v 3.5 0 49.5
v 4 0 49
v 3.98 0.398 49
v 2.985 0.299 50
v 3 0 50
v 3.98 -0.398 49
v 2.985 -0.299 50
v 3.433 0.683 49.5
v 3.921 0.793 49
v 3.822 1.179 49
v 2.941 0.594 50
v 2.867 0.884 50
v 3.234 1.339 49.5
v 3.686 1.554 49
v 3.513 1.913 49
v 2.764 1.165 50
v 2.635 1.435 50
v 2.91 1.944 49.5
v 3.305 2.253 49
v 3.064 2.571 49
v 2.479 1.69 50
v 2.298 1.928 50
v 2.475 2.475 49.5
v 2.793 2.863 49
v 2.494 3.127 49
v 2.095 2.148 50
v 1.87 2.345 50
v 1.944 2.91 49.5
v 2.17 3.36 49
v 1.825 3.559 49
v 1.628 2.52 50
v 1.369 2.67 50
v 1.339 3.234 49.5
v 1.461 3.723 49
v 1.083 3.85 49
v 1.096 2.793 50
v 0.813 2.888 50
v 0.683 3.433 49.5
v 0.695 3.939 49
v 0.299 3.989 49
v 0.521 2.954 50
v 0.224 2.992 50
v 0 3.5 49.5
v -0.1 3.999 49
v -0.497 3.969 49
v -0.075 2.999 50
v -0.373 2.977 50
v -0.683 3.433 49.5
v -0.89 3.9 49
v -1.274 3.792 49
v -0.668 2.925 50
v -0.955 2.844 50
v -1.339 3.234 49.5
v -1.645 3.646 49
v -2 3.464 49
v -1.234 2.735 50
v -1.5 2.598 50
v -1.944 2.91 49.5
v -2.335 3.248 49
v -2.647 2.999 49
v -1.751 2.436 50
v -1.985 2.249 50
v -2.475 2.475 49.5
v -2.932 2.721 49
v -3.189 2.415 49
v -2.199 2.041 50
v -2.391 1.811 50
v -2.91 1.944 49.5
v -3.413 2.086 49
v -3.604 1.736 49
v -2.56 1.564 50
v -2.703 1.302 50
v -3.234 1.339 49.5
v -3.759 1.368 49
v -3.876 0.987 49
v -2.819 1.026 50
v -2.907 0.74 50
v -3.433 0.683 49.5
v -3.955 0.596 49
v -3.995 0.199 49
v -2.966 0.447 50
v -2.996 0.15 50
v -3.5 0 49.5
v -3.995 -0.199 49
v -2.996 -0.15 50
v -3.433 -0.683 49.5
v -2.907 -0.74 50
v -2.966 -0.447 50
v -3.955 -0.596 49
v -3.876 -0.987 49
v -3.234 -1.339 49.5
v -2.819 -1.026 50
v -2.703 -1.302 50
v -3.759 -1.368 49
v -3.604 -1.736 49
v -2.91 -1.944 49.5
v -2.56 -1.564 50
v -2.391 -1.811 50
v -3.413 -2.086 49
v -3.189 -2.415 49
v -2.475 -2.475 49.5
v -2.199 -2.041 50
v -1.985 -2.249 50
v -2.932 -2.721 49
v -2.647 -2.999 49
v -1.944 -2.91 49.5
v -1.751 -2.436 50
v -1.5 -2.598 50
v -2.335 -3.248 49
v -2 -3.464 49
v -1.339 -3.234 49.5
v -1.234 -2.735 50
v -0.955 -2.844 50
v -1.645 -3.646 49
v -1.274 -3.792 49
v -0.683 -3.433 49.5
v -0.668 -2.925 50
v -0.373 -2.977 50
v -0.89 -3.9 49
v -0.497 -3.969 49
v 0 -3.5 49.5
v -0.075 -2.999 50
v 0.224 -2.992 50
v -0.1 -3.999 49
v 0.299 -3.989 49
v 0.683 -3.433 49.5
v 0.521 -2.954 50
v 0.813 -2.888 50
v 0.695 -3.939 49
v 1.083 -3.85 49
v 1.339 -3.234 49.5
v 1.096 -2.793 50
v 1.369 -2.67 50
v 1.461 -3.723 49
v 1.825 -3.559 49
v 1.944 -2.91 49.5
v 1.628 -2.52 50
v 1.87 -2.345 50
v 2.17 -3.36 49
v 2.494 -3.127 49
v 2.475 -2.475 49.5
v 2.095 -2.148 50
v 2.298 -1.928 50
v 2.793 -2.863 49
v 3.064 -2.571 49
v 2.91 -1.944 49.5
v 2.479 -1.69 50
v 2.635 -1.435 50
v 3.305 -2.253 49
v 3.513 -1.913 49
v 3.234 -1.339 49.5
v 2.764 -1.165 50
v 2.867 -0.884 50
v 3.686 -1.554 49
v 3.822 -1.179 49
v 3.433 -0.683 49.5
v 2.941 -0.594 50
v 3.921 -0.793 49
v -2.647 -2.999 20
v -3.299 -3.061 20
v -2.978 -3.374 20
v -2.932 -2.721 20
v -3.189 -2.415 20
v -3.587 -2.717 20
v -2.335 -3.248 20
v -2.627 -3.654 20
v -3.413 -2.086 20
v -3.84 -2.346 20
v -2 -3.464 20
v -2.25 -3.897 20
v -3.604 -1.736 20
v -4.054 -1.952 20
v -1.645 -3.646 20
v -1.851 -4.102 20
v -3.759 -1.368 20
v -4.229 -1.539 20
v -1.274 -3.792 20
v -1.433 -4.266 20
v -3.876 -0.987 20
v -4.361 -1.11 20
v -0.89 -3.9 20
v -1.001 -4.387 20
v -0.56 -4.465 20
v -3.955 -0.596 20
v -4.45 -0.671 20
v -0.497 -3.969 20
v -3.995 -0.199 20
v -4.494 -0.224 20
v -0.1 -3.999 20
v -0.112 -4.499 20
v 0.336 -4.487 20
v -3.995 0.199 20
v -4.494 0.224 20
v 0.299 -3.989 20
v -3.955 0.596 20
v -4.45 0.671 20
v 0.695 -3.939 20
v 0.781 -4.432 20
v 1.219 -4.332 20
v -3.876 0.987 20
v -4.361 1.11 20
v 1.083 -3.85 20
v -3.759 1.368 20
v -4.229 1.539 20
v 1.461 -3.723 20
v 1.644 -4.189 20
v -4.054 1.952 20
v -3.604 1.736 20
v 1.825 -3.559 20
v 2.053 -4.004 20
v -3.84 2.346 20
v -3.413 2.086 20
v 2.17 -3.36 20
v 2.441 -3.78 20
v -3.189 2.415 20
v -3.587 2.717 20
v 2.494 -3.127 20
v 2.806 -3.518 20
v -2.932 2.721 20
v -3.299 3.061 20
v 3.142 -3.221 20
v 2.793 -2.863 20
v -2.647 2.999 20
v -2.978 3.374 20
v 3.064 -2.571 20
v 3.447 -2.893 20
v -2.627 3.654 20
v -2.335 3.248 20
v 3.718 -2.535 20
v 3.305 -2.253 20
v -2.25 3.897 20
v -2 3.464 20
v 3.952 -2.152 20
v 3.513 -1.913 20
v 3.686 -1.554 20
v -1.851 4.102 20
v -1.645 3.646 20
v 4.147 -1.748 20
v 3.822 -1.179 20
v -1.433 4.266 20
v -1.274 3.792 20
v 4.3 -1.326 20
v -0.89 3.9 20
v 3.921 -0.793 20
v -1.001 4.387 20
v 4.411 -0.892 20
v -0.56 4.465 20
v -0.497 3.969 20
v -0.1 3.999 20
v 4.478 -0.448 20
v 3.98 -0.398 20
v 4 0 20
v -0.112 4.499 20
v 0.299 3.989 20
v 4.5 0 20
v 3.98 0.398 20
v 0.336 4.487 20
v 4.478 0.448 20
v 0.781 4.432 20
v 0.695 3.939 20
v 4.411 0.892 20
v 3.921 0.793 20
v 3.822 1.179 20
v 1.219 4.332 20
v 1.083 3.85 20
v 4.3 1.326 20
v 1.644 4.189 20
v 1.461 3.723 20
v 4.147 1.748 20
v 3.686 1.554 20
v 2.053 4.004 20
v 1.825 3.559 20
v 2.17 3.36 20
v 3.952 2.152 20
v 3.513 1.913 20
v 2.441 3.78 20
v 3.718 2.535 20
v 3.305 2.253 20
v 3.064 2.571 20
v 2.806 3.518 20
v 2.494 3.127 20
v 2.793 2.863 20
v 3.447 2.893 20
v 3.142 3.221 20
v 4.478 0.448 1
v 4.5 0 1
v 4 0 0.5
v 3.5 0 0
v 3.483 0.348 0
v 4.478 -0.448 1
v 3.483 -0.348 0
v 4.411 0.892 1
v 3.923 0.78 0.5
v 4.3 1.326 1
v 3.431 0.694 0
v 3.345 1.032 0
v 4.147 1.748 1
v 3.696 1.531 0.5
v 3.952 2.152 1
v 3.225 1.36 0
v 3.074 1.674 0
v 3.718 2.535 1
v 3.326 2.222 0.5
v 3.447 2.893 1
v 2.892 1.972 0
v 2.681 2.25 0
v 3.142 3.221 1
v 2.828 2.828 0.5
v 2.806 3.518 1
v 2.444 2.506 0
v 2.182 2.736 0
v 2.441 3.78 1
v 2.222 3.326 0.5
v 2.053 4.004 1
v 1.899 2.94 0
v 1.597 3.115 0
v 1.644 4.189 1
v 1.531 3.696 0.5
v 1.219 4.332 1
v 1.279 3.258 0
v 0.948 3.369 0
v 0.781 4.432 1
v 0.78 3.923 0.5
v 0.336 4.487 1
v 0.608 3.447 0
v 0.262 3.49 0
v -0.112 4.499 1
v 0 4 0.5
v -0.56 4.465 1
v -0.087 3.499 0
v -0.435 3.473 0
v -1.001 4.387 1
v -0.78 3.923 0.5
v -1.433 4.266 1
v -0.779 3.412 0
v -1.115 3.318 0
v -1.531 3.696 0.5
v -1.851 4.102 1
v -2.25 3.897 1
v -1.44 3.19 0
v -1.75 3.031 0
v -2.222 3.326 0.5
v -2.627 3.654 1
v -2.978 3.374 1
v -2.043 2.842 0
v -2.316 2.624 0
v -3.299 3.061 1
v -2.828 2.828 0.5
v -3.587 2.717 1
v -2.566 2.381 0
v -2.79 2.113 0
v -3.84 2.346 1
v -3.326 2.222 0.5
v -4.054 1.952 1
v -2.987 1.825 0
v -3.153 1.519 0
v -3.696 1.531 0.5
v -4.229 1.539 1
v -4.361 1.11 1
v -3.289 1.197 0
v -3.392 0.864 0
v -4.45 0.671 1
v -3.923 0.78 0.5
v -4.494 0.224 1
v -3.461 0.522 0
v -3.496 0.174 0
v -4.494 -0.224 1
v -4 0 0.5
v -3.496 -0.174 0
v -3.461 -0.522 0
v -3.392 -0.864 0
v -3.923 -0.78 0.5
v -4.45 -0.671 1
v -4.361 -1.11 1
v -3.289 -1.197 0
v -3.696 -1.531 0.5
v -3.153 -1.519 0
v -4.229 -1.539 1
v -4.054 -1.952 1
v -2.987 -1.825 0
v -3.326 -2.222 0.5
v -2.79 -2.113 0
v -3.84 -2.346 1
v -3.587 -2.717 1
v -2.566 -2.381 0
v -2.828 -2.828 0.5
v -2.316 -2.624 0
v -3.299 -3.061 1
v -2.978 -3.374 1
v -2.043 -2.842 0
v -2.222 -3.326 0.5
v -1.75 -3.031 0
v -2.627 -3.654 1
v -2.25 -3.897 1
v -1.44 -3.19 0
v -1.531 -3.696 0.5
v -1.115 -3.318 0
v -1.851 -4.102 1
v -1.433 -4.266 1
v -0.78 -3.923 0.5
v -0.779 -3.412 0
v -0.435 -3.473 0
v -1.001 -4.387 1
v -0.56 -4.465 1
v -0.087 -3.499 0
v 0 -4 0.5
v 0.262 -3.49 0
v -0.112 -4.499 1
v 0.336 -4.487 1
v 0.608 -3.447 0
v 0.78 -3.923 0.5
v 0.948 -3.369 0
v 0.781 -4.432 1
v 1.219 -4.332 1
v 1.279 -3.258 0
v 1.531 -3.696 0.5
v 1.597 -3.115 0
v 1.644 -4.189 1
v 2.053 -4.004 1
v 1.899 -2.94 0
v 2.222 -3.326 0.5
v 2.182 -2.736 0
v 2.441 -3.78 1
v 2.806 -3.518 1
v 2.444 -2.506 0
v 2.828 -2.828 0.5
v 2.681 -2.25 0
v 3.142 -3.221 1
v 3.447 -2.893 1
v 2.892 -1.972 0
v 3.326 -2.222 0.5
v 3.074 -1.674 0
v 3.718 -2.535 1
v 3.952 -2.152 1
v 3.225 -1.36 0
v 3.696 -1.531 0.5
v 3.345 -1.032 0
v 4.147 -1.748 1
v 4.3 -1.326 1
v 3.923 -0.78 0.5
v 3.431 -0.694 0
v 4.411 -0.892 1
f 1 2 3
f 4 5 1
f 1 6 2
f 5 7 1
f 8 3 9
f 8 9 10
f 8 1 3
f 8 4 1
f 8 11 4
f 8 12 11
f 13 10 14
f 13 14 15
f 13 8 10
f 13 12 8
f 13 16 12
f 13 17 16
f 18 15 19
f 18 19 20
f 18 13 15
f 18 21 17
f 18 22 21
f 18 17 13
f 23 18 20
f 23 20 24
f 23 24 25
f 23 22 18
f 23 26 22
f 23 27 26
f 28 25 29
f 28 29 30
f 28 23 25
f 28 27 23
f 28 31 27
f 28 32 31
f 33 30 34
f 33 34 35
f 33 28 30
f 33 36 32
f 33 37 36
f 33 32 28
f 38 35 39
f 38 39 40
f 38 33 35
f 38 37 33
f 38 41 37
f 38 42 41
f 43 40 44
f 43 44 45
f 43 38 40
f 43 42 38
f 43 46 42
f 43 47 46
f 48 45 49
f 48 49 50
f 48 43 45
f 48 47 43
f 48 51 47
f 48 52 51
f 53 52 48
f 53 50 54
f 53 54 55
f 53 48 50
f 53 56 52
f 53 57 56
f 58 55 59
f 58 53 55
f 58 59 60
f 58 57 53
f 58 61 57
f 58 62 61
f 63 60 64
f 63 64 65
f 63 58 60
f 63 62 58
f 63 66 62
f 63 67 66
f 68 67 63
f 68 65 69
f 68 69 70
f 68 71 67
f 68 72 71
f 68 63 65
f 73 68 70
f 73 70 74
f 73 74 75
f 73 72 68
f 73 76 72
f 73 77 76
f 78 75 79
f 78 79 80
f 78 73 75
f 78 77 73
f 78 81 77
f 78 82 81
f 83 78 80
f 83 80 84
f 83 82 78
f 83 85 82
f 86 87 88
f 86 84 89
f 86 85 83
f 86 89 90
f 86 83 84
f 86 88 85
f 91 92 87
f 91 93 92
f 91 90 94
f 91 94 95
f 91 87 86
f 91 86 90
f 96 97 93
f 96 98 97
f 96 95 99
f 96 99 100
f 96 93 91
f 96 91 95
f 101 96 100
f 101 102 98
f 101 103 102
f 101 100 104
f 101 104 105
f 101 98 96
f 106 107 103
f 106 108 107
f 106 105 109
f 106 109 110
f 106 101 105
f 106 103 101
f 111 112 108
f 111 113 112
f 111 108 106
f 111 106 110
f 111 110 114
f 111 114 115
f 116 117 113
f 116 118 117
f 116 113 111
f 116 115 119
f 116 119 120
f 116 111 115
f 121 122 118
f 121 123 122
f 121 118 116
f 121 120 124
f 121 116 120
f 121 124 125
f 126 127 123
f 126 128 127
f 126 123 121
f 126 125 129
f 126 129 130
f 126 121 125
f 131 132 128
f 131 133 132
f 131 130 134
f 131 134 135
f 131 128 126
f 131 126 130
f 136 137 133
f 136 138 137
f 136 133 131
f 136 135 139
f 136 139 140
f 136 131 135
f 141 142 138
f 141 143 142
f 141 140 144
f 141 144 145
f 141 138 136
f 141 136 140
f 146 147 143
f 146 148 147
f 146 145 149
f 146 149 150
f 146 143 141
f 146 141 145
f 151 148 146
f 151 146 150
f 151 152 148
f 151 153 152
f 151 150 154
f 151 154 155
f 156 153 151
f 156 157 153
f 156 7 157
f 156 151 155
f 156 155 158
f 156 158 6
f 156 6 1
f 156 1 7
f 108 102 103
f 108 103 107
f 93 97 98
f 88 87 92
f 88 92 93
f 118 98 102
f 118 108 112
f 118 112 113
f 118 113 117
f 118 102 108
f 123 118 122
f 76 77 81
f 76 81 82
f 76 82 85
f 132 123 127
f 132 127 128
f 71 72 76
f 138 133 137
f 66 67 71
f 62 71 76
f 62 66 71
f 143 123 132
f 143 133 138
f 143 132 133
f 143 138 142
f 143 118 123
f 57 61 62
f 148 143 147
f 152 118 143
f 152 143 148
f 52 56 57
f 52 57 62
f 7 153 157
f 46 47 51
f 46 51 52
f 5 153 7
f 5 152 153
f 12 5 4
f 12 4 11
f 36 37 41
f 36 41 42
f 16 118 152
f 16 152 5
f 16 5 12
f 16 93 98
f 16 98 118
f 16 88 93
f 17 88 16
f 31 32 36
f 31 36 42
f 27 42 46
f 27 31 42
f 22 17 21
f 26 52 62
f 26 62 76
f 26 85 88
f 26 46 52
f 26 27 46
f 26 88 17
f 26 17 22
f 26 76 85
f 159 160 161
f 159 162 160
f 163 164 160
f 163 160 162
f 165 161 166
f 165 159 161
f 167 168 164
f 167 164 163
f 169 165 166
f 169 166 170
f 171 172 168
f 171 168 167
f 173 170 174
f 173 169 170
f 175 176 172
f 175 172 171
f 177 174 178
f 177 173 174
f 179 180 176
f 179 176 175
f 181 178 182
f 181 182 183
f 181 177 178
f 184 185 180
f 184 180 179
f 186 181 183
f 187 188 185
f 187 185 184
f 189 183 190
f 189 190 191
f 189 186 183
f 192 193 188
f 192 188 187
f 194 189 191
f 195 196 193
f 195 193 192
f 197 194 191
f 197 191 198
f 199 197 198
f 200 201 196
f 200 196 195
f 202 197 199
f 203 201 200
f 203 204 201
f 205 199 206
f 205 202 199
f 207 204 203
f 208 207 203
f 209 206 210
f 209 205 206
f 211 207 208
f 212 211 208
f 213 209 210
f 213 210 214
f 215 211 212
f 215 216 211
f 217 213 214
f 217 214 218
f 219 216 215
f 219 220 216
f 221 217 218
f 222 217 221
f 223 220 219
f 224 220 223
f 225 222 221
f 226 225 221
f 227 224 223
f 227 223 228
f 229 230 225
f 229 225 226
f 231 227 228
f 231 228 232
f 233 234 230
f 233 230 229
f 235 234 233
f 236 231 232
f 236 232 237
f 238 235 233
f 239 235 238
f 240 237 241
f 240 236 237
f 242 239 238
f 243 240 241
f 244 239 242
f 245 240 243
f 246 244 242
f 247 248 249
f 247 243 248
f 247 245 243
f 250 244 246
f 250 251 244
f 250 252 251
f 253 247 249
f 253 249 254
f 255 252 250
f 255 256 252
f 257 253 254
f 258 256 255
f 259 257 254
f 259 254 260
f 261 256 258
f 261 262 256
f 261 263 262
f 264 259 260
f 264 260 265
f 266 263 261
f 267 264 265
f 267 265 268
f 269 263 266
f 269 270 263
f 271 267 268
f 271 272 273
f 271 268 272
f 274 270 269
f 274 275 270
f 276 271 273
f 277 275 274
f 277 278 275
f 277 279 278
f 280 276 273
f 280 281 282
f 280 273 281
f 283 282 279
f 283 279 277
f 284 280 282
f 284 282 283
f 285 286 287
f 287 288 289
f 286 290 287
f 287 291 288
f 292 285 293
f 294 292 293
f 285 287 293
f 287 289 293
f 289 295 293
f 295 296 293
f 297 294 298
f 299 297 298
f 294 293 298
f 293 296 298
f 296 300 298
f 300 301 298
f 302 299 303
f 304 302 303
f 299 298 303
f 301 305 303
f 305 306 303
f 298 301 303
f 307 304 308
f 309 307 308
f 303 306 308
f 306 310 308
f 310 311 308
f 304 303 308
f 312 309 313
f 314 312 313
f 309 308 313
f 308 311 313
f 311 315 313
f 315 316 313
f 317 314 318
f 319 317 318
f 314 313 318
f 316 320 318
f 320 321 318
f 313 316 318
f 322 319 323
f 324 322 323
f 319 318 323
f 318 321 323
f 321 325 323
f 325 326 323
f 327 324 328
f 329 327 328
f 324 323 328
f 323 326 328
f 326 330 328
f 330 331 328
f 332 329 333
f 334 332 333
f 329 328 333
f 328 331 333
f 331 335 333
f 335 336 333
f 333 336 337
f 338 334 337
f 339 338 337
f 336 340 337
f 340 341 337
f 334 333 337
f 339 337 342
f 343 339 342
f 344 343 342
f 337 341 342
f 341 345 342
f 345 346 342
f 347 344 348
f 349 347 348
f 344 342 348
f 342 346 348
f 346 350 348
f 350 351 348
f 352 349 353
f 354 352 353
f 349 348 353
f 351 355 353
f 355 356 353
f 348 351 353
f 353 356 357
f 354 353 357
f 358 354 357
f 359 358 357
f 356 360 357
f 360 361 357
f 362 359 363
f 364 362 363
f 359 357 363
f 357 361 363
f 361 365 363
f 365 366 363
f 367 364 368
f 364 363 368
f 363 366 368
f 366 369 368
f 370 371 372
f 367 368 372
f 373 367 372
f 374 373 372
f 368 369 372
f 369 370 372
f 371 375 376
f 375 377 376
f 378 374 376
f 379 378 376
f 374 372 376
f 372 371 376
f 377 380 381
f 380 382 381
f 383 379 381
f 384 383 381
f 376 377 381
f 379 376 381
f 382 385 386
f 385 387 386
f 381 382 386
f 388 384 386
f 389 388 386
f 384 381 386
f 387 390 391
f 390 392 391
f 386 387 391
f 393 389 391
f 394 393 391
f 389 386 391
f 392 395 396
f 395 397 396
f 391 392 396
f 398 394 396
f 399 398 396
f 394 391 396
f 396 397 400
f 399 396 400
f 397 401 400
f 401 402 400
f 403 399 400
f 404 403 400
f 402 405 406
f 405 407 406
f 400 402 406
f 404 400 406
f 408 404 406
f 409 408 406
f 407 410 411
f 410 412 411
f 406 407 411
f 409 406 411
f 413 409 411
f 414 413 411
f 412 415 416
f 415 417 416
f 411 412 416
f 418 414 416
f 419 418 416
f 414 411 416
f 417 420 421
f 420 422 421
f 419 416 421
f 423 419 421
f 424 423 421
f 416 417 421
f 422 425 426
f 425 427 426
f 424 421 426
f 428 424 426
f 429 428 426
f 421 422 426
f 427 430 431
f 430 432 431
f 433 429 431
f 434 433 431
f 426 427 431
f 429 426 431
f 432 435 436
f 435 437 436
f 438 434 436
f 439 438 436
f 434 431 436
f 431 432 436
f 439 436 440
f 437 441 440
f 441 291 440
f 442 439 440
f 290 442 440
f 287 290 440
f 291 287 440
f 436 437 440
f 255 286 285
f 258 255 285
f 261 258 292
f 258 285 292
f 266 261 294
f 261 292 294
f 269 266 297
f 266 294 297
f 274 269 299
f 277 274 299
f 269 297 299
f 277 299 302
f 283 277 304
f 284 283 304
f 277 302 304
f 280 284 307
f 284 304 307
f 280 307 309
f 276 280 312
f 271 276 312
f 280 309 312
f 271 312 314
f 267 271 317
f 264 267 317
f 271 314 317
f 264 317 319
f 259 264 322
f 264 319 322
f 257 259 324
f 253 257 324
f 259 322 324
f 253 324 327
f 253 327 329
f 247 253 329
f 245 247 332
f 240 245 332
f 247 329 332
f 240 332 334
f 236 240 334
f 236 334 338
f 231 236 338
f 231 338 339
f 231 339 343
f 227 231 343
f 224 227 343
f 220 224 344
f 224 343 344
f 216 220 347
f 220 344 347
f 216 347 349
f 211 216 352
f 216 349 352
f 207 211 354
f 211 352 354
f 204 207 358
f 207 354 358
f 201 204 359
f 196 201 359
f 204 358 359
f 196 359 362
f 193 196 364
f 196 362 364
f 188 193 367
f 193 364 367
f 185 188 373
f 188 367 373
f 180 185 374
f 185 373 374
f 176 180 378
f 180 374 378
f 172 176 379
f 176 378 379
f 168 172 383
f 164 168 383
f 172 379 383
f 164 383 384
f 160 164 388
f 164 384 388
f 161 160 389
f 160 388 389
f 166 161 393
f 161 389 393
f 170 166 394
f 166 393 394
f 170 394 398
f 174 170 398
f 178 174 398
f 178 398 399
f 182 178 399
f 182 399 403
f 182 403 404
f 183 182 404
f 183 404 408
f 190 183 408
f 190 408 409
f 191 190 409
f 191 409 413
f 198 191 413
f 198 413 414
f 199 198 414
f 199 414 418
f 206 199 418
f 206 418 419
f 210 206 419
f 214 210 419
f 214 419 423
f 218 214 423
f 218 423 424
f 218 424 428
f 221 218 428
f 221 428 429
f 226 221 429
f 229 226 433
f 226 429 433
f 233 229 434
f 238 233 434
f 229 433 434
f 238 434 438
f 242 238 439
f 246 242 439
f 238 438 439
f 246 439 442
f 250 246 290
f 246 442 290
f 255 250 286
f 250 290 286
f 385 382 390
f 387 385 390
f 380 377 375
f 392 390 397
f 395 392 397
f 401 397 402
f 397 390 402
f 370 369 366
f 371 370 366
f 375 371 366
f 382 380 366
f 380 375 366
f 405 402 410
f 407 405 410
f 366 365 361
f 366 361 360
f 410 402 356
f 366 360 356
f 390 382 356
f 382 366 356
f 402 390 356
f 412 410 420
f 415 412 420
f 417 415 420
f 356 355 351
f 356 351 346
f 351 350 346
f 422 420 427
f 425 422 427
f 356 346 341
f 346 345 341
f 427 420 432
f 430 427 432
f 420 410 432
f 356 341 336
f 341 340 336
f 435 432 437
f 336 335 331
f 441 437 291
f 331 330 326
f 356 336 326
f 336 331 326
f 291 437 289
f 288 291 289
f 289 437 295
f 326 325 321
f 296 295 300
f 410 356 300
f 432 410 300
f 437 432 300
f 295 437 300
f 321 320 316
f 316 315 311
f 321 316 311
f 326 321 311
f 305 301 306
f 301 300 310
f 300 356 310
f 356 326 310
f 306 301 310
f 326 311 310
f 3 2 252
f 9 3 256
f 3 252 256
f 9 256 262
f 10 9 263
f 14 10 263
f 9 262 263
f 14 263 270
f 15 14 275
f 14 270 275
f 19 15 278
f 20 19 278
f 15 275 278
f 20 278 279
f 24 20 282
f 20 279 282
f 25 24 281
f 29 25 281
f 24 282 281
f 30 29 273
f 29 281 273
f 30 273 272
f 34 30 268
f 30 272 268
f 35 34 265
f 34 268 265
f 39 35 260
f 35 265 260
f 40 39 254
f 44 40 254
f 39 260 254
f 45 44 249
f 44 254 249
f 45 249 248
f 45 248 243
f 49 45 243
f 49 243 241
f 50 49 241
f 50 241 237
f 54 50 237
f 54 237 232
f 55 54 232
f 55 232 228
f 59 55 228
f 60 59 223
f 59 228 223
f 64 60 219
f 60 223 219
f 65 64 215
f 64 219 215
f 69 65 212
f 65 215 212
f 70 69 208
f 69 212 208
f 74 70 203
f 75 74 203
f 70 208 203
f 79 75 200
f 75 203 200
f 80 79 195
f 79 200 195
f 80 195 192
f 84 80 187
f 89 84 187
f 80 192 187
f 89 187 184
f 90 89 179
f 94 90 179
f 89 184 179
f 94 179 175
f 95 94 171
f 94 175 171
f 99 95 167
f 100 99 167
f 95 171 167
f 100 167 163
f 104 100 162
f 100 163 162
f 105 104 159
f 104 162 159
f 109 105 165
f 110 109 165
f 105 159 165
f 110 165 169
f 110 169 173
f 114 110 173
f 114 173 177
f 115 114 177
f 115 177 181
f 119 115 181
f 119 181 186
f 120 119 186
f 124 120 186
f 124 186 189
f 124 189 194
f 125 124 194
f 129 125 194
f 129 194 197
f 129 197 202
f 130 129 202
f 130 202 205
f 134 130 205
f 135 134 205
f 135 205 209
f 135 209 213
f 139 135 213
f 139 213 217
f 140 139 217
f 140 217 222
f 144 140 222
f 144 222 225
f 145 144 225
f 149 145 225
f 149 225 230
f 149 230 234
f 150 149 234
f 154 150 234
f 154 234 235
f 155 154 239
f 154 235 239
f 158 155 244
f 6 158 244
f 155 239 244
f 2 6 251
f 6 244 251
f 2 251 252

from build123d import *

# Parameters (mm, degrees)
ESQUISSE1_R        = 4.5
BOSS_EXTRU_2_DEPTH = 20
ESQUISSE2_R        = 4
BOSS_EXTRU_3_DEPTH = 30
CHANFREIN1_SIZE    = 1


with BuildPart() as part:
    # Esquisse1 → Boss.-Extru.2 (new body)
    with BuildSketch(Plane.XY):
        Circle(ESQUISSE1_R)
    extrude(amount=BOSS_EXTRU_2_DEPTH)

    # Esquisse2 → Boss.-Extru.3 (add)
    with BuildSketch(Plane.XY.offset(20)):
        Circle(ESQUISSE2_R)
    extrude(amount=BOSS_EXTRU_3_DEPTH)

    # Chanfrein1
    chanfrein1_edges = [part.edges().sort_by_distance(p)[0] for p in [
        (-4.5, 0, 0),
        (-4, 0, 50),
    ]]
    chamfer(chanfrein1_edges, length=CHANFREIN1_SIZE)


solid = part.part
